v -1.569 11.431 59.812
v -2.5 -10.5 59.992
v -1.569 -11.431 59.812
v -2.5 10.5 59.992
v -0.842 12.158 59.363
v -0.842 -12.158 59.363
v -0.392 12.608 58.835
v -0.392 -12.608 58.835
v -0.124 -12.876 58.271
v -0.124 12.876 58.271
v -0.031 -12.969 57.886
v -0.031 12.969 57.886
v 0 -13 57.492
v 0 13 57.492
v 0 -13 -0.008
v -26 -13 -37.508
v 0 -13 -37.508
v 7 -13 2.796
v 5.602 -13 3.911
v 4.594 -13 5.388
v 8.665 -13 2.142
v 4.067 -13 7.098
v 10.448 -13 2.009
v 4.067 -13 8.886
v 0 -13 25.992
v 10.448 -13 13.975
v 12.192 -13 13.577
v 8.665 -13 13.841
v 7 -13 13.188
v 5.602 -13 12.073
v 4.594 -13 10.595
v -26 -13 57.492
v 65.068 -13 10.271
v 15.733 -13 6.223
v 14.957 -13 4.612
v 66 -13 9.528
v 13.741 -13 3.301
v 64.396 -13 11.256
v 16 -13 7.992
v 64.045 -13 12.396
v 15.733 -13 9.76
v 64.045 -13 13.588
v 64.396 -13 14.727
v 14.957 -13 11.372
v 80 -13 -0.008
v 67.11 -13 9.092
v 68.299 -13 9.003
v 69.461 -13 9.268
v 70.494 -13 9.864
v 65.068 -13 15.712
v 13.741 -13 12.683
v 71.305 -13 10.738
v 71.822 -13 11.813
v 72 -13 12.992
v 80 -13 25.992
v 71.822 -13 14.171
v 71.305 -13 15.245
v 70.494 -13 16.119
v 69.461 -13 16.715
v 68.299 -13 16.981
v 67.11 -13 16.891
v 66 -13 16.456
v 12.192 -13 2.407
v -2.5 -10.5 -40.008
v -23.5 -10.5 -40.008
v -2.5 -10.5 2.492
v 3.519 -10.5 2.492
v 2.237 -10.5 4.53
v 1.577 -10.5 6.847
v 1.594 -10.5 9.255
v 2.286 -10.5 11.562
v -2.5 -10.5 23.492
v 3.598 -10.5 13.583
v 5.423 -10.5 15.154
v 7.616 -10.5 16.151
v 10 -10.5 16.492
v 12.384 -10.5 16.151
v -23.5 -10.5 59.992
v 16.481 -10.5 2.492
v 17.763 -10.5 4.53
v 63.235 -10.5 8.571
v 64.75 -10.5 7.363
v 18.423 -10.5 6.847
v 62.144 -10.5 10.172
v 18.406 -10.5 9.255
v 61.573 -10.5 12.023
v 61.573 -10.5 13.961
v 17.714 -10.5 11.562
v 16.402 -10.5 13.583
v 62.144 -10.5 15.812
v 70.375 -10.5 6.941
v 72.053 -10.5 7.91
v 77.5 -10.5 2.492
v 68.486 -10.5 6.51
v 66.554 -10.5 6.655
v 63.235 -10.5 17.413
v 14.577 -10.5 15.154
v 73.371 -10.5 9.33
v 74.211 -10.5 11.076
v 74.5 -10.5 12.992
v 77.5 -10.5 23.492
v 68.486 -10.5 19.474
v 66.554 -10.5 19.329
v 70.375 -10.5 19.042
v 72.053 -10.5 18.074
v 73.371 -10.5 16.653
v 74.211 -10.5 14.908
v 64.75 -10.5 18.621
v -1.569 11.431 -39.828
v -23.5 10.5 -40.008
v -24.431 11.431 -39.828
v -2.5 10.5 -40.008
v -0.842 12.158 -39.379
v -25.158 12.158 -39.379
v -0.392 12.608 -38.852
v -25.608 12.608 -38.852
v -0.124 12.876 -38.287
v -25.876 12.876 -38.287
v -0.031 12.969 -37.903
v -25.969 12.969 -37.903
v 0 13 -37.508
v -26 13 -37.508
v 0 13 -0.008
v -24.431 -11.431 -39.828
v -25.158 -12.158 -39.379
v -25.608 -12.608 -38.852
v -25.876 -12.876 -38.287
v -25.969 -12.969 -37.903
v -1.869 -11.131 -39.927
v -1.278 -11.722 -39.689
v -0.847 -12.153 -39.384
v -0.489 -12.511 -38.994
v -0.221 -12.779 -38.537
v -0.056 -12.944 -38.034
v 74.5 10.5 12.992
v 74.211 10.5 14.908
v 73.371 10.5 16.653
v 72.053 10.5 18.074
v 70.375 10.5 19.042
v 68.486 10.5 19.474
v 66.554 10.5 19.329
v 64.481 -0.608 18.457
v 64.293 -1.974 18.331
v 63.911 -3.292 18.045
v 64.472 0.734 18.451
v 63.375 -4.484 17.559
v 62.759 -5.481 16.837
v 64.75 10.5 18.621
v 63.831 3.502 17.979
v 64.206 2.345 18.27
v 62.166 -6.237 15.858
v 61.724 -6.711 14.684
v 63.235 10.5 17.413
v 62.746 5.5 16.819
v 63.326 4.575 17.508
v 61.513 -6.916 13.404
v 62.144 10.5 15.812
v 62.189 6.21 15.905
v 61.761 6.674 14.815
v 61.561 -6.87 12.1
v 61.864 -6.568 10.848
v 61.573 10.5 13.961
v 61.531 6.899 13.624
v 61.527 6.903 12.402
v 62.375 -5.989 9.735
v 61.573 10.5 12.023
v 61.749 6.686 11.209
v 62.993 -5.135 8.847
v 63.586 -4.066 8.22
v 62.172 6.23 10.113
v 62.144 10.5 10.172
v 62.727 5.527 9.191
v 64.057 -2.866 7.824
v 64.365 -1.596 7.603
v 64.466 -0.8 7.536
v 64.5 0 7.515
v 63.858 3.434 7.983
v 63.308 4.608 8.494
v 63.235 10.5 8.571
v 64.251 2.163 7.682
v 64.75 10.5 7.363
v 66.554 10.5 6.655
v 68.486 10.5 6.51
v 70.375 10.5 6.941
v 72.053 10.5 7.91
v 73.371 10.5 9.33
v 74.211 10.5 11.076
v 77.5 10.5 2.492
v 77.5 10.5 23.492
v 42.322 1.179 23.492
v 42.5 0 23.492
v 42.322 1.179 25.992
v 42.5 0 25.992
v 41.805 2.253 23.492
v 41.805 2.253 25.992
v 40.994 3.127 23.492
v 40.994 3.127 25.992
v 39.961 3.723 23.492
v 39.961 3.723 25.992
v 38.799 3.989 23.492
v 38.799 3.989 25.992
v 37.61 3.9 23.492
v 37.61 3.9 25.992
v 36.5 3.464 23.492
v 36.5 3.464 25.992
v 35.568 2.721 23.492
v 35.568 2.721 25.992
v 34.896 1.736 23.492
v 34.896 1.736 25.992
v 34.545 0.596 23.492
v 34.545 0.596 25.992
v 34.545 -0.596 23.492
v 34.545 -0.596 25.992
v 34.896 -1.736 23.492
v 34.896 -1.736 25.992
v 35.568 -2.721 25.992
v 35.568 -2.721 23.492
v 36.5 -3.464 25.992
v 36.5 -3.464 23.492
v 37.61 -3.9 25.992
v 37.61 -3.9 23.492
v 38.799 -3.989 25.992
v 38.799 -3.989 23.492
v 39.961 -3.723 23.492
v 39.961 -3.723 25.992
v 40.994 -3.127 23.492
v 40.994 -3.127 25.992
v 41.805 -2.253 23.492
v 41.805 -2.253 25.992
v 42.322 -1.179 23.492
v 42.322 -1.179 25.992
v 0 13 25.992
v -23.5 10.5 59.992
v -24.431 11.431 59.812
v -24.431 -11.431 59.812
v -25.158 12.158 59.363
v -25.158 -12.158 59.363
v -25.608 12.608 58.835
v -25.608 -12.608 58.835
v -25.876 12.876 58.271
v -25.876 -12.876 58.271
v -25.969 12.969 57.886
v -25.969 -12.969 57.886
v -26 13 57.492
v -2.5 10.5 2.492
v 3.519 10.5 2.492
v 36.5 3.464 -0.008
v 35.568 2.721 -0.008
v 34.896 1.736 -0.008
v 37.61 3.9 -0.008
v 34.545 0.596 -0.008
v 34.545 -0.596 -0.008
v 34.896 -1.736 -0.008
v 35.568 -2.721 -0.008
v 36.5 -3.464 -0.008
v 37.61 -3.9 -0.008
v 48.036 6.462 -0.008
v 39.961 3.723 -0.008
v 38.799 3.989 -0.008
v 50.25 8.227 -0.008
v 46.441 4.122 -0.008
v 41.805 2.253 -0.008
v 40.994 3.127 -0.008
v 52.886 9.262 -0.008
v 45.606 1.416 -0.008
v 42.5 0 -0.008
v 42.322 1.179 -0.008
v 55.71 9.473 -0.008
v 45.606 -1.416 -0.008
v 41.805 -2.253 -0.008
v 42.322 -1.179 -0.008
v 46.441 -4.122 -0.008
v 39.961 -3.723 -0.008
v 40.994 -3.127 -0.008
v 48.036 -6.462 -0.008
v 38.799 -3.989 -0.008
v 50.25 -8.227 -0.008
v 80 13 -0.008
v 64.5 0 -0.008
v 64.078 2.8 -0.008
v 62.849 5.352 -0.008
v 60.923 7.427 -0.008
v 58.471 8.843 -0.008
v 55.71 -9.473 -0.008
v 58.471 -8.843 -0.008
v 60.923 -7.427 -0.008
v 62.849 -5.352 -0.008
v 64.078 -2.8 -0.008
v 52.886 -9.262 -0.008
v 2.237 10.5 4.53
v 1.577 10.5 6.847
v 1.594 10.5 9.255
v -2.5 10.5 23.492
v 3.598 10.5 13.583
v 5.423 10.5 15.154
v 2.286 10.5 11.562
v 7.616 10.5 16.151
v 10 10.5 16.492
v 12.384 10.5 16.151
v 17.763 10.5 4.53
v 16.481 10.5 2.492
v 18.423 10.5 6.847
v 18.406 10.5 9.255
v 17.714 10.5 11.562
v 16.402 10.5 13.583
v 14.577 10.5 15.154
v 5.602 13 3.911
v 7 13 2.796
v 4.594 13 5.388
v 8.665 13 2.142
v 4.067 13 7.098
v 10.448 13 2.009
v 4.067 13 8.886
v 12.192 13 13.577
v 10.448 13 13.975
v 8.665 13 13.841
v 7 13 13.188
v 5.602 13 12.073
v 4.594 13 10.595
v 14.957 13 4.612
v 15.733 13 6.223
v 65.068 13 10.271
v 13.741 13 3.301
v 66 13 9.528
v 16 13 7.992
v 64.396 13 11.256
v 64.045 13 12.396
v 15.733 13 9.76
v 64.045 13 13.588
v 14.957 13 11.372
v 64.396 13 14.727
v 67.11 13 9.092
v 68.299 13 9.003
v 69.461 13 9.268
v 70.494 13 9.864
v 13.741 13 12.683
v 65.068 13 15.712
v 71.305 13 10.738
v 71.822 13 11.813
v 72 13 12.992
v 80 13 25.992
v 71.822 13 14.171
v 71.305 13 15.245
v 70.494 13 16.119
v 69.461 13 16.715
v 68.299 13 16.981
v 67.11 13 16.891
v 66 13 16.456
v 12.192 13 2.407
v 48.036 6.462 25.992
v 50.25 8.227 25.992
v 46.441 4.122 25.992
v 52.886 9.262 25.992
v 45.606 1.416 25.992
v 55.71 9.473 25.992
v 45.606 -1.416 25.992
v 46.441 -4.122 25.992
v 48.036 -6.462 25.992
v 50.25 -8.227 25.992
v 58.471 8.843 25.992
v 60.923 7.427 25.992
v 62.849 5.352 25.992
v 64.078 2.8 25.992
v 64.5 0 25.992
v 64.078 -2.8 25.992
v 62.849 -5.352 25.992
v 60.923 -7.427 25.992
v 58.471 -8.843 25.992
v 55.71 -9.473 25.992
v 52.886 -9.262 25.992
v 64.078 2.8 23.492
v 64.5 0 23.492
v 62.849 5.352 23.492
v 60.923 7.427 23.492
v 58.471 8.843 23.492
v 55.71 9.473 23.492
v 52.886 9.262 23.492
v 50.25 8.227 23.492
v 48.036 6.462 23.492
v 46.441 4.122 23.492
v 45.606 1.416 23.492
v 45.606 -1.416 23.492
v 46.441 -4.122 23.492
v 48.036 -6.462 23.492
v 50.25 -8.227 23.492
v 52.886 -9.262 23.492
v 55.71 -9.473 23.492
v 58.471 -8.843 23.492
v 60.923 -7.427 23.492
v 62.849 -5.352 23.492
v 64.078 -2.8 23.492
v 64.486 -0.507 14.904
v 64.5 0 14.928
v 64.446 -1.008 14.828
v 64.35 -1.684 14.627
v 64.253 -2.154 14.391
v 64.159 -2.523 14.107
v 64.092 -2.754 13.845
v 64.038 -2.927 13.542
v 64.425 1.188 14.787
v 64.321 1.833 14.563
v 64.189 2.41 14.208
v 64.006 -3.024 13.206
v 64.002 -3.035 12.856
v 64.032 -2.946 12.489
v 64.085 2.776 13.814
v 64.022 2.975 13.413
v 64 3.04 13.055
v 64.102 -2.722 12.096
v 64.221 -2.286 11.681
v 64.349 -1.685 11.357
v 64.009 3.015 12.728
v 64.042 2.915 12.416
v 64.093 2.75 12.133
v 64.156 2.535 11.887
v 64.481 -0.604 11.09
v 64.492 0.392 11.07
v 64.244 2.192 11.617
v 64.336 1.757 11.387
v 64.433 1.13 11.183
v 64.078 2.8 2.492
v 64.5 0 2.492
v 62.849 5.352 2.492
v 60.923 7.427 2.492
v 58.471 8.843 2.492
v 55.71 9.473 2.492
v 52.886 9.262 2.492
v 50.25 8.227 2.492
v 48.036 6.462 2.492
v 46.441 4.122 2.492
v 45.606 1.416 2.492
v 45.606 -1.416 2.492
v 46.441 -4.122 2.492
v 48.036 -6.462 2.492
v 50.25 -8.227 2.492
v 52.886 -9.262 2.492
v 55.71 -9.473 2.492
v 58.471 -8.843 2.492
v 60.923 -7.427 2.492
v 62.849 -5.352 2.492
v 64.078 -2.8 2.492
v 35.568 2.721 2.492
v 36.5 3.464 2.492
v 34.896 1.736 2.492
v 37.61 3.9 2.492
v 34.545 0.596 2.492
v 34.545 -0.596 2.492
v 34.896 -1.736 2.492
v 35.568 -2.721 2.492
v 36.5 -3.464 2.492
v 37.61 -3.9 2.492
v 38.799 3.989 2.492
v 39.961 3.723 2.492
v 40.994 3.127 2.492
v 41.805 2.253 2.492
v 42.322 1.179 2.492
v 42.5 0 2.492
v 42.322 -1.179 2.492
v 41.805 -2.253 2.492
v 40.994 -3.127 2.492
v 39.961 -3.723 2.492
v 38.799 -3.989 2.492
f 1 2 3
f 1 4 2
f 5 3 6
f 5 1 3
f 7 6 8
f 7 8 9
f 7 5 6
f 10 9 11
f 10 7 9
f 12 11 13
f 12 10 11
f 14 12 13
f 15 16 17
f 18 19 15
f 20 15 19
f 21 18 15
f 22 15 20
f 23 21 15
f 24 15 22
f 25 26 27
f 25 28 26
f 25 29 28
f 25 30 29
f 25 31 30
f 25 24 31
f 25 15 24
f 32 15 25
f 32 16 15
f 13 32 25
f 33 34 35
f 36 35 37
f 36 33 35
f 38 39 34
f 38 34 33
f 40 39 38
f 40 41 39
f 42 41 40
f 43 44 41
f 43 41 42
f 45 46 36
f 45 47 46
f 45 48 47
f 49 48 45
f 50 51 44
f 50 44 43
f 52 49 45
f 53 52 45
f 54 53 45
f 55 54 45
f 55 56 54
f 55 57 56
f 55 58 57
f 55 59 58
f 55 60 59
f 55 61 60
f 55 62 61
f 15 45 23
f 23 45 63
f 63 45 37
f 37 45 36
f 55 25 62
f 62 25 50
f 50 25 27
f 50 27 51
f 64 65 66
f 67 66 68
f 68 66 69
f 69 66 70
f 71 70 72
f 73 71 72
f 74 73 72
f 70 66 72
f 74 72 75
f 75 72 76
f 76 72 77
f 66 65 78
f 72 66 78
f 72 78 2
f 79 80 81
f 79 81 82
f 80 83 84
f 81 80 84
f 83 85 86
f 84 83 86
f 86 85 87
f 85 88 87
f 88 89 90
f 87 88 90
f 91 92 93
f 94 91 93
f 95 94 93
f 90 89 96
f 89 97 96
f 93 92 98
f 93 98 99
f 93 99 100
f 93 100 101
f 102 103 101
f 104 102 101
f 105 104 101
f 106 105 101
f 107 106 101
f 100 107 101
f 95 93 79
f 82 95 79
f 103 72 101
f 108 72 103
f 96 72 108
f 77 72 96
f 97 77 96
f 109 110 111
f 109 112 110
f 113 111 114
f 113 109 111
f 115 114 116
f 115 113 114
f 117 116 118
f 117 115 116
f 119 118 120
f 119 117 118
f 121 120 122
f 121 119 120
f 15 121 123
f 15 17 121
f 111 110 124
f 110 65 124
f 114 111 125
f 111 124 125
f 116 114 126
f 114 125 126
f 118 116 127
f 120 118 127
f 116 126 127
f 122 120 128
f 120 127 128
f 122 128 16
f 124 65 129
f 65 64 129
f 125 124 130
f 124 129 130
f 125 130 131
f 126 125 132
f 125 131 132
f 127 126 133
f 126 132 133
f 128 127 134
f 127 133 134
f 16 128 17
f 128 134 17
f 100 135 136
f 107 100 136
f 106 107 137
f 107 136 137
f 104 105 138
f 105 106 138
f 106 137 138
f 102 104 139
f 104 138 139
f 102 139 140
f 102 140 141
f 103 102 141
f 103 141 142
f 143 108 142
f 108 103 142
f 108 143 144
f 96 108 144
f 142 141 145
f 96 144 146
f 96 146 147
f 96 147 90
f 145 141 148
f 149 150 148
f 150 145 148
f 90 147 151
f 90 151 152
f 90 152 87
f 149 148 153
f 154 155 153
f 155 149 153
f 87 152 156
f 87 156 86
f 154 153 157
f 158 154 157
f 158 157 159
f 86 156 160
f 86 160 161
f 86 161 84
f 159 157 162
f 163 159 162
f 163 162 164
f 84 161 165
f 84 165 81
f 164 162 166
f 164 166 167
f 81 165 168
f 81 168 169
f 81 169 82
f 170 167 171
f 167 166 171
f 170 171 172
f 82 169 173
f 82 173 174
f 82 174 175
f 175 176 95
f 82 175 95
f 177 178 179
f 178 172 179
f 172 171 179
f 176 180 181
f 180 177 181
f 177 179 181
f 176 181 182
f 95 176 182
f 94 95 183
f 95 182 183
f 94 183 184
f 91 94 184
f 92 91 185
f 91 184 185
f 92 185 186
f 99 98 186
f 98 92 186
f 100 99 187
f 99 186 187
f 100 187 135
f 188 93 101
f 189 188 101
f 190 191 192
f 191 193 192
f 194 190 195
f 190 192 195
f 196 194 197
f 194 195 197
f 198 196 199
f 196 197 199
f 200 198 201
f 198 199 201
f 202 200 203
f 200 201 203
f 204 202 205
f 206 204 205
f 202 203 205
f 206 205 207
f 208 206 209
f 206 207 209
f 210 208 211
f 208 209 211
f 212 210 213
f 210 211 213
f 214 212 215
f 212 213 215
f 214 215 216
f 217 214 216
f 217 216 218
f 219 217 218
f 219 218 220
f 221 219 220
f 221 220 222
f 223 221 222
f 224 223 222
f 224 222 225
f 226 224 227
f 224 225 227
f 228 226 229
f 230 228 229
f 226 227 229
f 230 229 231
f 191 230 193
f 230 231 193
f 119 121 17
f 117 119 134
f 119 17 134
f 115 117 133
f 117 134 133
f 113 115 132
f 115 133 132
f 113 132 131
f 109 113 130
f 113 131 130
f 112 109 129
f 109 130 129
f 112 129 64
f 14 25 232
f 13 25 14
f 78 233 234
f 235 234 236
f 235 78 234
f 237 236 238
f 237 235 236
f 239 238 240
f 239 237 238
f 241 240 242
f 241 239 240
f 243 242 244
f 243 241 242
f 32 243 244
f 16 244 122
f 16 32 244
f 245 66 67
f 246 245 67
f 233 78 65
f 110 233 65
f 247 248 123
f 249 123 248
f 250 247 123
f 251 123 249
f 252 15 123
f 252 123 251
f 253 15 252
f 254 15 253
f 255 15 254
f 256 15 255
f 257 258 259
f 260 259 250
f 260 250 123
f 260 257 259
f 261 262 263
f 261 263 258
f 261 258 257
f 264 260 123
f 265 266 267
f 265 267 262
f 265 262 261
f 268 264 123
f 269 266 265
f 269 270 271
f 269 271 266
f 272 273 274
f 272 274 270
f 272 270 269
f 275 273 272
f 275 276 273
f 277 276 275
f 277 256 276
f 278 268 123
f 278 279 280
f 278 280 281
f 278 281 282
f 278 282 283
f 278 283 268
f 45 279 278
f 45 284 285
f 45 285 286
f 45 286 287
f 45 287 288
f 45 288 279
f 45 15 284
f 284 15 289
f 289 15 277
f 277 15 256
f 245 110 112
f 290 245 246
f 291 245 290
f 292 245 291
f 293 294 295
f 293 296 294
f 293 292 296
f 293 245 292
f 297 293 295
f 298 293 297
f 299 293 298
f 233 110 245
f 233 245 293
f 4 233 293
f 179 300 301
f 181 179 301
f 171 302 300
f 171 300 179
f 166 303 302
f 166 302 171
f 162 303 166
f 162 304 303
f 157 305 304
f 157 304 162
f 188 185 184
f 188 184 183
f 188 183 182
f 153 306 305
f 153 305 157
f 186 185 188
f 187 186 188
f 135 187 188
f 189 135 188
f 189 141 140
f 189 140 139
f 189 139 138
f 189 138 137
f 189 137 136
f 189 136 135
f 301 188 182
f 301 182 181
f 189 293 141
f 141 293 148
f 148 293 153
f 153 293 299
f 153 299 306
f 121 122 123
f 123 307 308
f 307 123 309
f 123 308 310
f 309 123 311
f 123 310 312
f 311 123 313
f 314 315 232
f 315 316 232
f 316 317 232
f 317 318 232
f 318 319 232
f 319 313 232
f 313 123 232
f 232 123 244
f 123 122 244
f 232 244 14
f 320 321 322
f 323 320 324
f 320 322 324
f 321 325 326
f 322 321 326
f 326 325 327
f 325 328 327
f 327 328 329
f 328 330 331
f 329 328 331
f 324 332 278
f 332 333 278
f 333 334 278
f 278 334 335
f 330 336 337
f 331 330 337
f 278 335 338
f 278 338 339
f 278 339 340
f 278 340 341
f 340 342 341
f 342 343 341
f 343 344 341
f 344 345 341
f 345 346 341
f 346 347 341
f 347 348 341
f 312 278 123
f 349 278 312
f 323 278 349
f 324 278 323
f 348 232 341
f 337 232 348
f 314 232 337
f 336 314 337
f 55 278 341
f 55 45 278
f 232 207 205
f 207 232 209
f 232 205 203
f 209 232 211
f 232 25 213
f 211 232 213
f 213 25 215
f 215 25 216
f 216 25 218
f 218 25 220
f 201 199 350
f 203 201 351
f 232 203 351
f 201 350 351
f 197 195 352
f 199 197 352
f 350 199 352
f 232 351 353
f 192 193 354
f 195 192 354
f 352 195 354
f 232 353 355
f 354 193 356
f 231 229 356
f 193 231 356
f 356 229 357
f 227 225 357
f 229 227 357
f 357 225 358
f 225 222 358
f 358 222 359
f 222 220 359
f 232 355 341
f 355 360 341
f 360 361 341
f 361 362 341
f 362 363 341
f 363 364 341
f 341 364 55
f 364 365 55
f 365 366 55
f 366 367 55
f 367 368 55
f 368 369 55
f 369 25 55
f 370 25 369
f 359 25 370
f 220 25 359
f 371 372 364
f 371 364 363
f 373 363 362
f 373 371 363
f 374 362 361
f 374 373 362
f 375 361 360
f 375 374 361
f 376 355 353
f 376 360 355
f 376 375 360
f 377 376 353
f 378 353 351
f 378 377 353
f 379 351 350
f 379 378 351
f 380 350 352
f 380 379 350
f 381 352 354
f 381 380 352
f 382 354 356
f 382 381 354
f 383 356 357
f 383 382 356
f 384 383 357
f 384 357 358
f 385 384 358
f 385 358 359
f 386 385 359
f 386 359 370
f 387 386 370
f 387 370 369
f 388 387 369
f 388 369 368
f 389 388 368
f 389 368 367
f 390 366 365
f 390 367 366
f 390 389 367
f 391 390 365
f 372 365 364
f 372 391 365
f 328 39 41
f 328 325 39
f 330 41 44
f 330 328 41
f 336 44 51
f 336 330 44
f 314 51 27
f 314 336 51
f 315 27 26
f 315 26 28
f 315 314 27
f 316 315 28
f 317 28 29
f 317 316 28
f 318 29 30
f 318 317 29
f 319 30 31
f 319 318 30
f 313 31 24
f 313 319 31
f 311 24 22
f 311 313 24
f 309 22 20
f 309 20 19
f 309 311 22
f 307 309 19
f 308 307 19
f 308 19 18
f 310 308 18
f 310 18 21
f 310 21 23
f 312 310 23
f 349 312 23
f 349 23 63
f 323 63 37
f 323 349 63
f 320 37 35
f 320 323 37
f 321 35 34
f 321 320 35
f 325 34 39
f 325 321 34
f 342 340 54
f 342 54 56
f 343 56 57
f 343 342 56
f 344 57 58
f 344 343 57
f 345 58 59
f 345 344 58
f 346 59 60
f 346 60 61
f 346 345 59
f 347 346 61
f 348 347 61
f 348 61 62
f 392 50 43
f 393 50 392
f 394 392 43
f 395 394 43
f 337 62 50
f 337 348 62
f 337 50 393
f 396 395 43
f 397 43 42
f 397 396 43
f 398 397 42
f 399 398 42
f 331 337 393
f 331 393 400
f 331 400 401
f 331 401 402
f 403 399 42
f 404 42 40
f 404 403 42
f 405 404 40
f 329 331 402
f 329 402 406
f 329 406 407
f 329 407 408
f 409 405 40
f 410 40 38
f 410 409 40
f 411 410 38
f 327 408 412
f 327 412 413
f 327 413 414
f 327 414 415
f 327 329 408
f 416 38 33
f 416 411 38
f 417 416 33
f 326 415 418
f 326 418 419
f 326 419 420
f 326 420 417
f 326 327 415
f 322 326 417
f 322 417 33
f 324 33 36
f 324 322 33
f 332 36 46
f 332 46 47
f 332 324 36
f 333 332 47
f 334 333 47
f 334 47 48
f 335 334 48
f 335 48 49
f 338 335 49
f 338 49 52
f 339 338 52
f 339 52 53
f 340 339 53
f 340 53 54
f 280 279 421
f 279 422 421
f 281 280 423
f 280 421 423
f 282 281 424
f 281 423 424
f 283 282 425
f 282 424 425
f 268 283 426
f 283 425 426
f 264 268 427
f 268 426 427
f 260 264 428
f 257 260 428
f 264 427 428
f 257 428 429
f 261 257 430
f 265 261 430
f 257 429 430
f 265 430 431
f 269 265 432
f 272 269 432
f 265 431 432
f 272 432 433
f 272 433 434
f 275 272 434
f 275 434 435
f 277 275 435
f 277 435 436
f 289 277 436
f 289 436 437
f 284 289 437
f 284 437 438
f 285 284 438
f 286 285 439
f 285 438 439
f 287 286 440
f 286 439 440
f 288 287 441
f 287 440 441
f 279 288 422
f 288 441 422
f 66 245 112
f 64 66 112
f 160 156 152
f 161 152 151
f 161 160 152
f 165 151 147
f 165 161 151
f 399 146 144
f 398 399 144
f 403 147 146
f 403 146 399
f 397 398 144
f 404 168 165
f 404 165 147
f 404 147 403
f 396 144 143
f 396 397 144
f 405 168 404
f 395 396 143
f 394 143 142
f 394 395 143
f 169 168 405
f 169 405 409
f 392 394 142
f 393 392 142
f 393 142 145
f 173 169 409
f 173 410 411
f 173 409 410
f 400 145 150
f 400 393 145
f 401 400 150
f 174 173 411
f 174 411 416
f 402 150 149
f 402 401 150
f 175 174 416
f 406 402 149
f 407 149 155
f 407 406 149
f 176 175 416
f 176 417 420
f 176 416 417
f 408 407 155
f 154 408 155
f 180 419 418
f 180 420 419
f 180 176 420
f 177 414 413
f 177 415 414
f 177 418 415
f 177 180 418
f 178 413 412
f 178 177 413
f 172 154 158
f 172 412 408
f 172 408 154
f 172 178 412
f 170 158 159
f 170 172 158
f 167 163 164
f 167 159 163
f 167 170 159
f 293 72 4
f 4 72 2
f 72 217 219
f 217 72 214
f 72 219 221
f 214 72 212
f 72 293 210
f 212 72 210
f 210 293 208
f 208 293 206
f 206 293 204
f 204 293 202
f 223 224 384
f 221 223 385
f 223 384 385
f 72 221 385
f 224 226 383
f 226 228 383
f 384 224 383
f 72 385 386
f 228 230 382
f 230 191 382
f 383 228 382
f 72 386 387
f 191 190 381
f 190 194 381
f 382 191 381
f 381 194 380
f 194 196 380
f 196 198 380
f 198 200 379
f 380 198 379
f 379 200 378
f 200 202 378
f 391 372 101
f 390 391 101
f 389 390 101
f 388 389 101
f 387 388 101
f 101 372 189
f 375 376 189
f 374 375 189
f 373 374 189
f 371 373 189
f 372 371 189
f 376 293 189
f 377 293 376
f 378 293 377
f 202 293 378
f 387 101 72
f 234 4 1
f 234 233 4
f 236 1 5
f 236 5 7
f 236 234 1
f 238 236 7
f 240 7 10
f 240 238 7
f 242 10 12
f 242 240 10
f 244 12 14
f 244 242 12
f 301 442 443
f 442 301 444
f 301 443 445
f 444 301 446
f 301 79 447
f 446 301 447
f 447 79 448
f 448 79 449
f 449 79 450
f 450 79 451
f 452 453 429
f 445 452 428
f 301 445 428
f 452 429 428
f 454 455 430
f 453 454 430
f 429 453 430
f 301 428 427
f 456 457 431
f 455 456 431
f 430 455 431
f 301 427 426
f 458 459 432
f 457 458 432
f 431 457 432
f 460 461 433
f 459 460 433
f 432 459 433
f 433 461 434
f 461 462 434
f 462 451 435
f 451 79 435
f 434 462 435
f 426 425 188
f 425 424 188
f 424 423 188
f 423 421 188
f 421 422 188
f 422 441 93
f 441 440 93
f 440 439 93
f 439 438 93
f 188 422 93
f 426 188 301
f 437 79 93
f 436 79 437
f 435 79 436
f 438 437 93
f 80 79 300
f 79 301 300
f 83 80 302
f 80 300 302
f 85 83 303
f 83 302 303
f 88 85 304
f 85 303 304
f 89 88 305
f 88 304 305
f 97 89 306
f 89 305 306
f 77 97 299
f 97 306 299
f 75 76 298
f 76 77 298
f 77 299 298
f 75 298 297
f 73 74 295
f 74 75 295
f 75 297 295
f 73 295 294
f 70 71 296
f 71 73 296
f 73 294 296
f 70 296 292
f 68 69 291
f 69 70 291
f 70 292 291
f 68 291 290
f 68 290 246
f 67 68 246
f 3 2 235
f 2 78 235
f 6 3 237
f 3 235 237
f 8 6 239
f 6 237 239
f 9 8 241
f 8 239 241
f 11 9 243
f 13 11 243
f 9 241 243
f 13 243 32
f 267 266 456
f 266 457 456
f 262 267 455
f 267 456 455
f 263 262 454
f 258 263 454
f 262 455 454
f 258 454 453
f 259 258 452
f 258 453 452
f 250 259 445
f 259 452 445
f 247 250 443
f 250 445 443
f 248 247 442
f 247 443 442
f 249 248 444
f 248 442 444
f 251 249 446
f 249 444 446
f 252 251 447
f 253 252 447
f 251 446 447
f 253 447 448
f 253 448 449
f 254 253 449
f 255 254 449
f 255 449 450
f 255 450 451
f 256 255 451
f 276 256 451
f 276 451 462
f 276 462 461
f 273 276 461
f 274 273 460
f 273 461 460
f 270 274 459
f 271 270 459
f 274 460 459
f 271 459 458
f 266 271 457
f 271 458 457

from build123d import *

# Parameters (mm, degrees)
F0_W        = 80
F0_H        = 26
F0_R        = 6
F0_R_2      = 4
F1_DEPTH    = 13
F2_T        = 2.5
F2_T3_DEPTH = 31
F3_R        = 9.5
F3_R_2      = 4
F4_DEPTH    = 50
F5_R        = 2.49999


# Not quite as in the source:
# - a fillet or chamfer is up to 0.001 mm smaller than in the source, because OpenCascade refuses the exact size
# - a shell that OpenCascade refuses in one call is made with other operations: the cavity is built on its own and cut out


with BuildPart() as f1:
    # F0 (on Front) → F1 (new body, symmetric)
    with BuildSketch(Plane.XZ):
        Polygon((0, 25.9917649148), (0, 59.9917649148), (-26, 59.9917649148), (-26, -40.0082350852), (0, -40.0082350852), (0, -0.0082350852), align=None)
        with Locations((40, 12.9917649148)):
            Rectangle(F0_W, F0_H)
        with Locations((10, 7.9917649148)):
            Circle(F0_R, mode=Mode.SUBTRACT)
        with Locations((68, 12.9917649148)):
            Circle(F0_R_2, mode=Mode.SUBTRACT)
    extrude(amount=F1_DEPTH, both=True)

    # F2: shell of thickness 2.5, made by hand


with BuildPart() as f2_core1:
    # F2_t2: copy of F1
    add(f1.part)

    # the walls: a layer under each face that stays
    f2_faces = [f2_core1.faces().sort_by_distance(p)[0] for p in [
        (0, 0, 42.9917649148),
        (40, 0, 25.9917649148),
        (80, 0, 12.9917649148),
        (40, 0, -0.0082350852),
        (0, 0, -20.0082350852),
        (-26, 0, 9.9917649148),
        (27, -13, 9.9917649148),
        (4, 0, 7.9917649148),
        (64, 0, 12.9917649148),
        (27, 13, 9.9917649148),
    ]]
    thicken(f2_faces, amount=-F2_T, mode=Mode.SUBTRACT)

    # F2_s4 → F2_t3 (cut)
    with BuildSketch(Plane.XZ.offset(-15.5)):
        Polygon((0.025, 26.0167649148), (-2.5, 25.9917649148), (-2.5, 23.4917649148), (0, 23.4917649148), align=None)
        Polygon((0.025, -0.0332350852), (0, 2.4917649148), (-2.5, 2.4917649148), (-2.5, -0.0082350852), align=None)
    extrude(amount=F2_T3_DEPTH, mode=Mode.SUBTRACT)


with BuildPart() as f1_1:
    add(f1.part)

    # what is left inside the walls is the cavity
    f2_cavity = [f2_core1.part.solids().sort_by_distance(p)[0] for p in [
        (-10.875, 10.475, 4.436209),
    ]]
    add(f2_cavity, mode=Mode.SUBTRACT)

    # F3 (on Top) → F4 (cut, symmetric)
    with BuildSketch(Plane.XY):
        with Locations((55, 0)):
            Circle(F3_R)
        with Locations((38.5, 0)):
            Circle(F3_R_2)
    extrude(amount=F4_DEPTH, both=True, mode=Mode.SUBTRACT)

    # F5 (radius 2.5 in the source; OpenCascade refuses exactly that, so slightly less here)
    f5_edges = [f1_1.edges().sort_by_distance(p)[0] for p in [
        (0, 0, 59.991765),
        (-13, -13, 59.991765),
        (-13, 13, 59.991765),
        (-26, 0, 59.991765),
        (-26, 0, -40.008235),
        (-13, 13, -40.008235),
        (0, 0, -40.008235),
        (-13, -13, -40.008235),
    ]]
    fillet(f5_edges, radius=F5_R)


solid = f1_1.part
